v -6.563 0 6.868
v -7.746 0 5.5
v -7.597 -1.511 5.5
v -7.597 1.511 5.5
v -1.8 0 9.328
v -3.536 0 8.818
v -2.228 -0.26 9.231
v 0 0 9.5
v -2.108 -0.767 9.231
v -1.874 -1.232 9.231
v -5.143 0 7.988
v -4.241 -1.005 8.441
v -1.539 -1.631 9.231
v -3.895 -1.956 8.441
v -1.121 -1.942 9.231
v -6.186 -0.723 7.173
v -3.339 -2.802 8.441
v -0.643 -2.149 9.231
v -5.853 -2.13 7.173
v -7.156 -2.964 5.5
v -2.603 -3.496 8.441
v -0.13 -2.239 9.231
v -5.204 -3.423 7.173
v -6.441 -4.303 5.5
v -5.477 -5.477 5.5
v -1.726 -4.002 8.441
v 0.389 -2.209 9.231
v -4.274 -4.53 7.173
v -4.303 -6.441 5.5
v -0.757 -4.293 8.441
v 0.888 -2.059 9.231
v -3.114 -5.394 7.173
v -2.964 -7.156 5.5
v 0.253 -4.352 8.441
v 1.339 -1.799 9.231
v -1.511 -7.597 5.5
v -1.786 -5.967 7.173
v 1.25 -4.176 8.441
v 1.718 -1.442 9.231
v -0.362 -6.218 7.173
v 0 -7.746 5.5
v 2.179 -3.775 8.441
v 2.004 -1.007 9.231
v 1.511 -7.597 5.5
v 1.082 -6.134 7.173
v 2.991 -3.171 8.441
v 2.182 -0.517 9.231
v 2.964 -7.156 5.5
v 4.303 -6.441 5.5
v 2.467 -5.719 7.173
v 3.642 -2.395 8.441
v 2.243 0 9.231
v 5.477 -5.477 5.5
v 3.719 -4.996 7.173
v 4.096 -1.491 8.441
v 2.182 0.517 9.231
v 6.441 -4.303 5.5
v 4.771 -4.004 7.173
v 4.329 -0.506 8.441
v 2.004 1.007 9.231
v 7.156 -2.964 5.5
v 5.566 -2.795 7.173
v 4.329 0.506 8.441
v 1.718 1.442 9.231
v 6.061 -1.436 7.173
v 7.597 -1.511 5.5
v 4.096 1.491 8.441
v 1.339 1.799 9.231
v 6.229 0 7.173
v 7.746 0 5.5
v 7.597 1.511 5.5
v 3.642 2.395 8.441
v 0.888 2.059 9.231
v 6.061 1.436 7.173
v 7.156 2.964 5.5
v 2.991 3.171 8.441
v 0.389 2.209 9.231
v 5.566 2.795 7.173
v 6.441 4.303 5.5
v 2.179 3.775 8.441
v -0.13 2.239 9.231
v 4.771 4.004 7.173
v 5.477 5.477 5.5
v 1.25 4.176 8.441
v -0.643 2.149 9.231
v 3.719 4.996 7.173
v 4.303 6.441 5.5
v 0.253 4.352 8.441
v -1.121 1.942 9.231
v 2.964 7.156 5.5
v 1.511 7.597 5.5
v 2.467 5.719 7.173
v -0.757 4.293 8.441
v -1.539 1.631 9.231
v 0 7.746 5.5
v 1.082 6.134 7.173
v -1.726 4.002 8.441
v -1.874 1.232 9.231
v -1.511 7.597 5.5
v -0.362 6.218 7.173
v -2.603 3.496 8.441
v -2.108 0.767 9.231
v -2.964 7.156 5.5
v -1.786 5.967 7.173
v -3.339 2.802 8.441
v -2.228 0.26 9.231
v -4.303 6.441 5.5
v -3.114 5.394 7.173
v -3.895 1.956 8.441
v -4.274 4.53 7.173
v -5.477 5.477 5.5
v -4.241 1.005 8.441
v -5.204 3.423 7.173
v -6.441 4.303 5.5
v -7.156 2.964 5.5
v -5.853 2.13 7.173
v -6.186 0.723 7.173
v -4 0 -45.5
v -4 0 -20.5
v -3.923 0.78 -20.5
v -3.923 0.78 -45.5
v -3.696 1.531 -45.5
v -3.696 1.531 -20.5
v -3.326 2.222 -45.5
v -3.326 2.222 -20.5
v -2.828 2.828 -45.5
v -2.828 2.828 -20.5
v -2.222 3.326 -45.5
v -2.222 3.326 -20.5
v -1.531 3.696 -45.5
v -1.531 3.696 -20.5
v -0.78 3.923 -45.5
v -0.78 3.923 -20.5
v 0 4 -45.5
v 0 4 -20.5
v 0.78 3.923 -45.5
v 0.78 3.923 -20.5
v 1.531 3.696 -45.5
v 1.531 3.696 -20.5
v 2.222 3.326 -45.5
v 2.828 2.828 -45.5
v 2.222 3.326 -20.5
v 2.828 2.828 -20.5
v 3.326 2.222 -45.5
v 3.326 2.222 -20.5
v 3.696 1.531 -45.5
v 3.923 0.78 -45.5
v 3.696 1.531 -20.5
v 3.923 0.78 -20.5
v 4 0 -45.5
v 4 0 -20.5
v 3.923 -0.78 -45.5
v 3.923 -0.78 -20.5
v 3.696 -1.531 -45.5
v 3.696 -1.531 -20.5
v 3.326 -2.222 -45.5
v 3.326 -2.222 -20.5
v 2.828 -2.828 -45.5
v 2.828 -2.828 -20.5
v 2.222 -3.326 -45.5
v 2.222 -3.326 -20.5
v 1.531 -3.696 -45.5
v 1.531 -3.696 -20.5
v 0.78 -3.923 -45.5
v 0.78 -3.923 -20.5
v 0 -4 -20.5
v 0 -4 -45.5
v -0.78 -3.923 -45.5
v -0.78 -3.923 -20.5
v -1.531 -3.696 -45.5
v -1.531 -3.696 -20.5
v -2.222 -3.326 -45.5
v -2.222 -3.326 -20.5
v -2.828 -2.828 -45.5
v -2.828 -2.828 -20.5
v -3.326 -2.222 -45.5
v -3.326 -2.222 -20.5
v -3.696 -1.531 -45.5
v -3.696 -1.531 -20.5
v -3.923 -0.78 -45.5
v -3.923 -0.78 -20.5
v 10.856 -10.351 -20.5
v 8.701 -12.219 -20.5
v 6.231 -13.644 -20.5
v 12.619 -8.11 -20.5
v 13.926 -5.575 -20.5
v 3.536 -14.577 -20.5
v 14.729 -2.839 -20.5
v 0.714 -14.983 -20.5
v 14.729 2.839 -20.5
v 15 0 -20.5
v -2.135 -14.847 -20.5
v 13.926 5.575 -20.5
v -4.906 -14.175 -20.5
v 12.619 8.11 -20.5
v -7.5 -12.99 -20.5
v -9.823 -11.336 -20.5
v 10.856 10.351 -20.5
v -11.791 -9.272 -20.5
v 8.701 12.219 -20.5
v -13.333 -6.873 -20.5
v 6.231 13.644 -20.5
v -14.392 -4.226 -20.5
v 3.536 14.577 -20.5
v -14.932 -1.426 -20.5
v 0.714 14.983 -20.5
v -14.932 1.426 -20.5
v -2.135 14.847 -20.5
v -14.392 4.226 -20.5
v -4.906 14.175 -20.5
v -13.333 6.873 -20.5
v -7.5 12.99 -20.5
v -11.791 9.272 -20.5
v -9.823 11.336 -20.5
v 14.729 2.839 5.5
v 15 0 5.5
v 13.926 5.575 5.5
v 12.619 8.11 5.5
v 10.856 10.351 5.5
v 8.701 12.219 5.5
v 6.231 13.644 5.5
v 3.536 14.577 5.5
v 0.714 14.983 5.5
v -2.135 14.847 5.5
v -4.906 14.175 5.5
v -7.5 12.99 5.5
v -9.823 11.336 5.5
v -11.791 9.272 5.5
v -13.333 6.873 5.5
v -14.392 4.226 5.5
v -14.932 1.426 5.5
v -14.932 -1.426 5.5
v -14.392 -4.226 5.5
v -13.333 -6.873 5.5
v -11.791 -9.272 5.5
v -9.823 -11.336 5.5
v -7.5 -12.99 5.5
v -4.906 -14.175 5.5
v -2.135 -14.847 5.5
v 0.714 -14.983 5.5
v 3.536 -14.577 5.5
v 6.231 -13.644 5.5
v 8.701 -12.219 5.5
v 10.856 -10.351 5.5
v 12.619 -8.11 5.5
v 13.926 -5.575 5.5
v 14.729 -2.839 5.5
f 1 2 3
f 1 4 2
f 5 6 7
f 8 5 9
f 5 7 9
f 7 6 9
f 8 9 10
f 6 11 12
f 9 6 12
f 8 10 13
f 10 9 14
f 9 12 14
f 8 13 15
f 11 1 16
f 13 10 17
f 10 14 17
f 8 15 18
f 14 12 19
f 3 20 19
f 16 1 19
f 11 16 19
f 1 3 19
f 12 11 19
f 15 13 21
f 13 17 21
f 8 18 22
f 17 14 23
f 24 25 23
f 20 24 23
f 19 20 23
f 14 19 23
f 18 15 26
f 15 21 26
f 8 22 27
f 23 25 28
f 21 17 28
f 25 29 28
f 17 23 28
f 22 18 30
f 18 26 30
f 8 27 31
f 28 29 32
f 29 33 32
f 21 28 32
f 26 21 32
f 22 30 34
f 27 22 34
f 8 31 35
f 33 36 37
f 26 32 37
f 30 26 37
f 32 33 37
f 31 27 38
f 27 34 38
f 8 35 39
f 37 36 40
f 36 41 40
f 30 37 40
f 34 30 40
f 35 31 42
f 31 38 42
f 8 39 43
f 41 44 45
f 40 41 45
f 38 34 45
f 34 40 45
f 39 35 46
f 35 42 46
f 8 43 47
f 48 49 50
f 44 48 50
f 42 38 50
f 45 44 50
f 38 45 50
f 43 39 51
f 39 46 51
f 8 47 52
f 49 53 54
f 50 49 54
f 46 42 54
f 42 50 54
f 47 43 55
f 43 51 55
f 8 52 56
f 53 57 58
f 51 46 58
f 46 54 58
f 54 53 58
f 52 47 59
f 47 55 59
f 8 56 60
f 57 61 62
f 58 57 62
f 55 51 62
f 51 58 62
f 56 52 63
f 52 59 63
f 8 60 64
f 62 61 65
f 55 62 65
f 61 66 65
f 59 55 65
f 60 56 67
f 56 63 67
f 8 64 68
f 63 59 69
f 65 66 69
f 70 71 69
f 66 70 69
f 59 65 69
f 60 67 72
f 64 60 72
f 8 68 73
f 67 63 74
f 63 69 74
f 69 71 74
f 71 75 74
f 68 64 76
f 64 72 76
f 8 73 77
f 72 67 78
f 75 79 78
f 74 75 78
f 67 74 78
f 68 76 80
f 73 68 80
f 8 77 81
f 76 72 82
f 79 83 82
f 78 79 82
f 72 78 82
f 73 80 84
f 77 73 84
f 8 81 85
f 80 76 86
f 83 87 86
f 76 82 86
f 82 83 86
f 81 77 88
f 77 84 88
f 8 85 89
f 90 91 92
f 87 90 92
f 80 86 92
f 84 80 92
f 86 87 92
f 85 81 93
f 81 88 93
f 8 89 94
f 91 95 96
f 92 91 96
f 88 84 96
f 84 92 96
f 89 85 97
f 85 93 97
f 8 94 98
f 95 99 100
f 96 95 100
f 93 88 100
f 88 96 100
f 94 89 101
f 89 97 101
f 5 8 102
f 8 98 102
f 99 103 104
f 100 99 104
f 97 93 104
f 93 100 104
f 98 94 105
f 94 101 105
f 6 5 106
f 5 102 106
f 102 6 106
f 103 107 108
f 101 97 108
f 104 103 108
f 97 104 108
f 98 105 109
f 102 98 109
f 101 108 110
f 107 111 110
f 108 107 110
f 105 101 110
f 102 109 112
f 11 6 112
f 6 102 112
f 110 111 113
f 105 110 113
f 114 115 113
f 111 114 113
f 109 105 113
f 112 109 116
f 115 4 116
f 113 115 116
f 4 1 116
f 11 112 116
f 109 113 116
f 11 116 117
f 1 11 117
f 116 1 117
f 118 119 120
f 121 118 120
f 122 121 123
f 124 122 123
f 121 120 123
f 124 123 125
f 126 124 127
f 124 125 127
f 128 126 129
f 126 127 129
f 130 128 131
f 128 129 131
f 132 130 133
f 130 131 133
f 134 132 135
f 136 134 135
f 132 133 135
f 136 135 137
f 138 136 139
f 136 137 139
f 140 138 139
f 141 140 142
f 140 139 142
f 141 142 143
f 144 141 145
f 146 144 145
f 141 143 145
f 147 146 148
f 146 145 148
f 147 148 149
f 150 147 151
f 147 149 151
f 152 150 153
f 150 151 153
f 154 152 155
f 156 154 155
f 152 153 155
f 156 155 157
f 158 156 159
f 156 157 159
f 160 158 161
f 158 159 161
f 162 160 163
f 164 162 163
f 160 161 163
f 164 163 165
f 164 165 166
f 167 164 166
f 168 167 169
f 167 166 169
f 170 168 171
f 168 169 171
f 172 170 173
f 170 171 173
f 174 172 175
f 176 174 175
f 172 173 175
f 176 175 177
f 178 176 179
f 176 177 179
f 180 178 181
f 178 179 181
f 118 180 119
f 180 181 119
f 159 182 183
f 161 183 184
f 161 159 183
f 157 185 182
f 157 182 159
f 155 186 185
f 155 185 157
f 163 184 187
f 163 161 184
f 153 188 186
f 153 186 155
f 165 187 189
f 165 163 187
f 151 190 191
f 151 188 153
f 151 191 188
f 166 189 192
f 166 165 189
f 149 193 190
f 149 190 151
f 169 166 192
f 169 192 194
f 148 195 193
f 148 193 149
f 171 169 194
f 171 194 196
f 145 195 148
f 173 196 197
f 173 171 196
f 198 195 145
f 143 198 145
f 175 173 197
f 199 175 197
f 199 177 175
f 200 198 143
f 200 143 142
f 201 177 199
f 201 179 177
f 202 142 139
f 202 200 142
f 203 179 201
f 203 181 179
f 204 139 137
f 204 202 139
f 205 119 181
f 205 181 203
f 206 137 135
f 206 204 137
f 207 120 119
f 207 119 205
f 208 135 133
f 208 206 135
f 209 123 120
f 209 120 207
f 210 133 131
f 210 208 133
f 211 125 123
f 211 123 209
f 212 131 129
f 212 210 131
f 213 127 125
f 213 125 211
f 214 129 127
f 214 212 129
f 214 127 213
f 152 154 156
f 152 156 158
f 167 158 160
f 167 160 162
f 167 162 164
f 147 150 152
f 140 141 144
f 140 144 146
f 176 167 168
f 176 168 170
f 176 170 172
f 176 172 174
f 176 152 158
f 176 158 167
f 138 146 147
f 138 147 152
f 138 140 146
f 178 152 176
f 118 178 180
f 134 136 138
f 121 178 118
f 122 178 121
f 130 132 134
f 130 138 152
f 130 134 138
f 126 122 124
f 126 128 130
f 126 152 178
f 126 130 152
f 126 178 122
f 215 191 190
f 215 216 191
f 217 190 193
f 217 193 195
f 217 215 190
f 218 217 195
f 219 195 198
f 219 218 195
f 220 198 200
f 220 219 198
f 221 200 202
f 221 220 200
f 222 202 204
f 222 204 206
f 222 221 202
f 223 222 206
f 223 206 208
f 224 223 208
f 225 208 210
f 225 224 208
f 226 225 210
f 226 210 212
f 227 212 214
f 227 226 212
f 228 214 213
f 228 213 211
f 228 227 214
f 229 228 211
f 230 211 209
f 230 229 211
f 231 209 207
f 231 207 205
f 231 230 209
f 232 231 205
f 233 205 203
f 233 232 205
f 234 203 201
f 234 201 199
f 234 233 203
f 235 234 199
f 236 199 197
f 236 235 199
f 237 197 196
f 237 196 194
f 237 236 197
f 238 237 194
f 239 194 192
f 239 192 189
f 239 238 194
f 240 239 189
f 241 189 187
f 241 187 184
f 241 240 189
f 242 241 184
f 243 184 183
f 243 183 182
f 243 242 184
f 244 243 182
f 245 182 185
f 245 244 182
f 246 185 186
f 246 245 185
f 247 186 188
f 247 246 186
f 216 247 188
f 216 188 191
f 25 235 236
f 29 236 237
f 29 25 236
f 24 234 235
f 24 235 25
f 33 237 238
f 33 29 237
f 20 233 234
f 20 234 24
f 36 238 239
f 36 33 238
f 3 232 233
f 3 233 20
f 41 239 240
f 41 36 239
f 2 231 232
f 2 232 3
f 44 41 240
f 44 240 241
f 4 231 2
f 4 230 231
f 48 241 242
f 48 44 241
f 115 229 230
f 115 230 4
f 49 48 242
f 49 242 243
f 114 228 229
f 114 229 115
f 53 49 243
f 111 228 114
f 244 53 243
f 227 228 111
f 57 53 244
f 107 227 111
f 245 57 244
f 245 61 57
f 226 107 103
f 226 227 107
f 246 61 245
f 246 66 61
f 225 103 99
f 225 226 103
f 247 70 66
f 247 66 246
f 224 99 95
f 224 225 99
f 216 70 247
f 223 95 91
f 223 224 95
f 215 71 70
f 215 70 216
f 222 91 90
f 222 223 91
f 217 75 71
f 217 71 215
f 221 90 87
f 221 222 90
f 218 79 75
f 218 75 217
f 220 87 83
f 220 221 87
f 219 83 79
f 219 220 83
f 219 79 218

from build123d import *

# Parameters (mm, degrees)
SKETCH3_R           = 4
BOSS_EXTRUDE1_DEPTH = 25


with BuildPart() as part:
    # Sketch1 → Revolve6 (revolve)
    with BuildSketch(Plane(origin=(0, 0, 0), x_dir=(1, 0, 0), z_dir=(0, 1, 0))):
        with BuildLine():
            Line((0, 9.5), (0, -9.5))
            ThreePointArc((0, -9.5), (-9.5, 0), (0, 9.5))
        make_face()
    revolve(axis=Axis((0, 0, -9.5), (0, 0, 1)))

    # Sketch2 → Revolve7 (revolve)
    with BuildSketch(Plane(origin=(0, 0, 0), x_dir=(1, 0, 0), z_dir=(0, 1, 0)), mode=Mode.PRIVATE) as revolve7_sk:
        with BuildLine():
            ThreePointArc((-7.745966692, -5.5), (-9.050875195, -2.886461192), (-9.5, 0))
            Line((-9.5, 0), (-15, 0))
            Line((-15, 0), (-15, -5.5))
            Line((-15, -5.5), (-7.745966692, -5.5))
        make_face()
        with BuildLine():
            Line((-15, 0), (-9.5, 0))
            ThreePointArc((-9.5, 0), (-6.717514421, 6.717514421), (0, 9.5))
            Line((0, 9.5), (0, 20.5))
            Line((0, 20.5), (-15, 20.5))
            Line((-15, 20.5), (-15, 0))
        make_face()
    revolve(revolve7_sk.sketch.rotate(Axis((0, 0, -20.5), (0, 0, 1)), 180), axis=Axis((0, 0, -20.5), (0, 0, 1)))

    # Sketch3 → Boss-Extrude1 (add)
    with BuildSketch(Plane(origin=(0, 0, -20.5), x_dir=(-1, 0, 0), z_dir=(0, 0, -1))):
        Circle(SKETCH3_R)
    extrude(amount=BOSS_EXTRUDE1_DEPTH)


solid = part.part
